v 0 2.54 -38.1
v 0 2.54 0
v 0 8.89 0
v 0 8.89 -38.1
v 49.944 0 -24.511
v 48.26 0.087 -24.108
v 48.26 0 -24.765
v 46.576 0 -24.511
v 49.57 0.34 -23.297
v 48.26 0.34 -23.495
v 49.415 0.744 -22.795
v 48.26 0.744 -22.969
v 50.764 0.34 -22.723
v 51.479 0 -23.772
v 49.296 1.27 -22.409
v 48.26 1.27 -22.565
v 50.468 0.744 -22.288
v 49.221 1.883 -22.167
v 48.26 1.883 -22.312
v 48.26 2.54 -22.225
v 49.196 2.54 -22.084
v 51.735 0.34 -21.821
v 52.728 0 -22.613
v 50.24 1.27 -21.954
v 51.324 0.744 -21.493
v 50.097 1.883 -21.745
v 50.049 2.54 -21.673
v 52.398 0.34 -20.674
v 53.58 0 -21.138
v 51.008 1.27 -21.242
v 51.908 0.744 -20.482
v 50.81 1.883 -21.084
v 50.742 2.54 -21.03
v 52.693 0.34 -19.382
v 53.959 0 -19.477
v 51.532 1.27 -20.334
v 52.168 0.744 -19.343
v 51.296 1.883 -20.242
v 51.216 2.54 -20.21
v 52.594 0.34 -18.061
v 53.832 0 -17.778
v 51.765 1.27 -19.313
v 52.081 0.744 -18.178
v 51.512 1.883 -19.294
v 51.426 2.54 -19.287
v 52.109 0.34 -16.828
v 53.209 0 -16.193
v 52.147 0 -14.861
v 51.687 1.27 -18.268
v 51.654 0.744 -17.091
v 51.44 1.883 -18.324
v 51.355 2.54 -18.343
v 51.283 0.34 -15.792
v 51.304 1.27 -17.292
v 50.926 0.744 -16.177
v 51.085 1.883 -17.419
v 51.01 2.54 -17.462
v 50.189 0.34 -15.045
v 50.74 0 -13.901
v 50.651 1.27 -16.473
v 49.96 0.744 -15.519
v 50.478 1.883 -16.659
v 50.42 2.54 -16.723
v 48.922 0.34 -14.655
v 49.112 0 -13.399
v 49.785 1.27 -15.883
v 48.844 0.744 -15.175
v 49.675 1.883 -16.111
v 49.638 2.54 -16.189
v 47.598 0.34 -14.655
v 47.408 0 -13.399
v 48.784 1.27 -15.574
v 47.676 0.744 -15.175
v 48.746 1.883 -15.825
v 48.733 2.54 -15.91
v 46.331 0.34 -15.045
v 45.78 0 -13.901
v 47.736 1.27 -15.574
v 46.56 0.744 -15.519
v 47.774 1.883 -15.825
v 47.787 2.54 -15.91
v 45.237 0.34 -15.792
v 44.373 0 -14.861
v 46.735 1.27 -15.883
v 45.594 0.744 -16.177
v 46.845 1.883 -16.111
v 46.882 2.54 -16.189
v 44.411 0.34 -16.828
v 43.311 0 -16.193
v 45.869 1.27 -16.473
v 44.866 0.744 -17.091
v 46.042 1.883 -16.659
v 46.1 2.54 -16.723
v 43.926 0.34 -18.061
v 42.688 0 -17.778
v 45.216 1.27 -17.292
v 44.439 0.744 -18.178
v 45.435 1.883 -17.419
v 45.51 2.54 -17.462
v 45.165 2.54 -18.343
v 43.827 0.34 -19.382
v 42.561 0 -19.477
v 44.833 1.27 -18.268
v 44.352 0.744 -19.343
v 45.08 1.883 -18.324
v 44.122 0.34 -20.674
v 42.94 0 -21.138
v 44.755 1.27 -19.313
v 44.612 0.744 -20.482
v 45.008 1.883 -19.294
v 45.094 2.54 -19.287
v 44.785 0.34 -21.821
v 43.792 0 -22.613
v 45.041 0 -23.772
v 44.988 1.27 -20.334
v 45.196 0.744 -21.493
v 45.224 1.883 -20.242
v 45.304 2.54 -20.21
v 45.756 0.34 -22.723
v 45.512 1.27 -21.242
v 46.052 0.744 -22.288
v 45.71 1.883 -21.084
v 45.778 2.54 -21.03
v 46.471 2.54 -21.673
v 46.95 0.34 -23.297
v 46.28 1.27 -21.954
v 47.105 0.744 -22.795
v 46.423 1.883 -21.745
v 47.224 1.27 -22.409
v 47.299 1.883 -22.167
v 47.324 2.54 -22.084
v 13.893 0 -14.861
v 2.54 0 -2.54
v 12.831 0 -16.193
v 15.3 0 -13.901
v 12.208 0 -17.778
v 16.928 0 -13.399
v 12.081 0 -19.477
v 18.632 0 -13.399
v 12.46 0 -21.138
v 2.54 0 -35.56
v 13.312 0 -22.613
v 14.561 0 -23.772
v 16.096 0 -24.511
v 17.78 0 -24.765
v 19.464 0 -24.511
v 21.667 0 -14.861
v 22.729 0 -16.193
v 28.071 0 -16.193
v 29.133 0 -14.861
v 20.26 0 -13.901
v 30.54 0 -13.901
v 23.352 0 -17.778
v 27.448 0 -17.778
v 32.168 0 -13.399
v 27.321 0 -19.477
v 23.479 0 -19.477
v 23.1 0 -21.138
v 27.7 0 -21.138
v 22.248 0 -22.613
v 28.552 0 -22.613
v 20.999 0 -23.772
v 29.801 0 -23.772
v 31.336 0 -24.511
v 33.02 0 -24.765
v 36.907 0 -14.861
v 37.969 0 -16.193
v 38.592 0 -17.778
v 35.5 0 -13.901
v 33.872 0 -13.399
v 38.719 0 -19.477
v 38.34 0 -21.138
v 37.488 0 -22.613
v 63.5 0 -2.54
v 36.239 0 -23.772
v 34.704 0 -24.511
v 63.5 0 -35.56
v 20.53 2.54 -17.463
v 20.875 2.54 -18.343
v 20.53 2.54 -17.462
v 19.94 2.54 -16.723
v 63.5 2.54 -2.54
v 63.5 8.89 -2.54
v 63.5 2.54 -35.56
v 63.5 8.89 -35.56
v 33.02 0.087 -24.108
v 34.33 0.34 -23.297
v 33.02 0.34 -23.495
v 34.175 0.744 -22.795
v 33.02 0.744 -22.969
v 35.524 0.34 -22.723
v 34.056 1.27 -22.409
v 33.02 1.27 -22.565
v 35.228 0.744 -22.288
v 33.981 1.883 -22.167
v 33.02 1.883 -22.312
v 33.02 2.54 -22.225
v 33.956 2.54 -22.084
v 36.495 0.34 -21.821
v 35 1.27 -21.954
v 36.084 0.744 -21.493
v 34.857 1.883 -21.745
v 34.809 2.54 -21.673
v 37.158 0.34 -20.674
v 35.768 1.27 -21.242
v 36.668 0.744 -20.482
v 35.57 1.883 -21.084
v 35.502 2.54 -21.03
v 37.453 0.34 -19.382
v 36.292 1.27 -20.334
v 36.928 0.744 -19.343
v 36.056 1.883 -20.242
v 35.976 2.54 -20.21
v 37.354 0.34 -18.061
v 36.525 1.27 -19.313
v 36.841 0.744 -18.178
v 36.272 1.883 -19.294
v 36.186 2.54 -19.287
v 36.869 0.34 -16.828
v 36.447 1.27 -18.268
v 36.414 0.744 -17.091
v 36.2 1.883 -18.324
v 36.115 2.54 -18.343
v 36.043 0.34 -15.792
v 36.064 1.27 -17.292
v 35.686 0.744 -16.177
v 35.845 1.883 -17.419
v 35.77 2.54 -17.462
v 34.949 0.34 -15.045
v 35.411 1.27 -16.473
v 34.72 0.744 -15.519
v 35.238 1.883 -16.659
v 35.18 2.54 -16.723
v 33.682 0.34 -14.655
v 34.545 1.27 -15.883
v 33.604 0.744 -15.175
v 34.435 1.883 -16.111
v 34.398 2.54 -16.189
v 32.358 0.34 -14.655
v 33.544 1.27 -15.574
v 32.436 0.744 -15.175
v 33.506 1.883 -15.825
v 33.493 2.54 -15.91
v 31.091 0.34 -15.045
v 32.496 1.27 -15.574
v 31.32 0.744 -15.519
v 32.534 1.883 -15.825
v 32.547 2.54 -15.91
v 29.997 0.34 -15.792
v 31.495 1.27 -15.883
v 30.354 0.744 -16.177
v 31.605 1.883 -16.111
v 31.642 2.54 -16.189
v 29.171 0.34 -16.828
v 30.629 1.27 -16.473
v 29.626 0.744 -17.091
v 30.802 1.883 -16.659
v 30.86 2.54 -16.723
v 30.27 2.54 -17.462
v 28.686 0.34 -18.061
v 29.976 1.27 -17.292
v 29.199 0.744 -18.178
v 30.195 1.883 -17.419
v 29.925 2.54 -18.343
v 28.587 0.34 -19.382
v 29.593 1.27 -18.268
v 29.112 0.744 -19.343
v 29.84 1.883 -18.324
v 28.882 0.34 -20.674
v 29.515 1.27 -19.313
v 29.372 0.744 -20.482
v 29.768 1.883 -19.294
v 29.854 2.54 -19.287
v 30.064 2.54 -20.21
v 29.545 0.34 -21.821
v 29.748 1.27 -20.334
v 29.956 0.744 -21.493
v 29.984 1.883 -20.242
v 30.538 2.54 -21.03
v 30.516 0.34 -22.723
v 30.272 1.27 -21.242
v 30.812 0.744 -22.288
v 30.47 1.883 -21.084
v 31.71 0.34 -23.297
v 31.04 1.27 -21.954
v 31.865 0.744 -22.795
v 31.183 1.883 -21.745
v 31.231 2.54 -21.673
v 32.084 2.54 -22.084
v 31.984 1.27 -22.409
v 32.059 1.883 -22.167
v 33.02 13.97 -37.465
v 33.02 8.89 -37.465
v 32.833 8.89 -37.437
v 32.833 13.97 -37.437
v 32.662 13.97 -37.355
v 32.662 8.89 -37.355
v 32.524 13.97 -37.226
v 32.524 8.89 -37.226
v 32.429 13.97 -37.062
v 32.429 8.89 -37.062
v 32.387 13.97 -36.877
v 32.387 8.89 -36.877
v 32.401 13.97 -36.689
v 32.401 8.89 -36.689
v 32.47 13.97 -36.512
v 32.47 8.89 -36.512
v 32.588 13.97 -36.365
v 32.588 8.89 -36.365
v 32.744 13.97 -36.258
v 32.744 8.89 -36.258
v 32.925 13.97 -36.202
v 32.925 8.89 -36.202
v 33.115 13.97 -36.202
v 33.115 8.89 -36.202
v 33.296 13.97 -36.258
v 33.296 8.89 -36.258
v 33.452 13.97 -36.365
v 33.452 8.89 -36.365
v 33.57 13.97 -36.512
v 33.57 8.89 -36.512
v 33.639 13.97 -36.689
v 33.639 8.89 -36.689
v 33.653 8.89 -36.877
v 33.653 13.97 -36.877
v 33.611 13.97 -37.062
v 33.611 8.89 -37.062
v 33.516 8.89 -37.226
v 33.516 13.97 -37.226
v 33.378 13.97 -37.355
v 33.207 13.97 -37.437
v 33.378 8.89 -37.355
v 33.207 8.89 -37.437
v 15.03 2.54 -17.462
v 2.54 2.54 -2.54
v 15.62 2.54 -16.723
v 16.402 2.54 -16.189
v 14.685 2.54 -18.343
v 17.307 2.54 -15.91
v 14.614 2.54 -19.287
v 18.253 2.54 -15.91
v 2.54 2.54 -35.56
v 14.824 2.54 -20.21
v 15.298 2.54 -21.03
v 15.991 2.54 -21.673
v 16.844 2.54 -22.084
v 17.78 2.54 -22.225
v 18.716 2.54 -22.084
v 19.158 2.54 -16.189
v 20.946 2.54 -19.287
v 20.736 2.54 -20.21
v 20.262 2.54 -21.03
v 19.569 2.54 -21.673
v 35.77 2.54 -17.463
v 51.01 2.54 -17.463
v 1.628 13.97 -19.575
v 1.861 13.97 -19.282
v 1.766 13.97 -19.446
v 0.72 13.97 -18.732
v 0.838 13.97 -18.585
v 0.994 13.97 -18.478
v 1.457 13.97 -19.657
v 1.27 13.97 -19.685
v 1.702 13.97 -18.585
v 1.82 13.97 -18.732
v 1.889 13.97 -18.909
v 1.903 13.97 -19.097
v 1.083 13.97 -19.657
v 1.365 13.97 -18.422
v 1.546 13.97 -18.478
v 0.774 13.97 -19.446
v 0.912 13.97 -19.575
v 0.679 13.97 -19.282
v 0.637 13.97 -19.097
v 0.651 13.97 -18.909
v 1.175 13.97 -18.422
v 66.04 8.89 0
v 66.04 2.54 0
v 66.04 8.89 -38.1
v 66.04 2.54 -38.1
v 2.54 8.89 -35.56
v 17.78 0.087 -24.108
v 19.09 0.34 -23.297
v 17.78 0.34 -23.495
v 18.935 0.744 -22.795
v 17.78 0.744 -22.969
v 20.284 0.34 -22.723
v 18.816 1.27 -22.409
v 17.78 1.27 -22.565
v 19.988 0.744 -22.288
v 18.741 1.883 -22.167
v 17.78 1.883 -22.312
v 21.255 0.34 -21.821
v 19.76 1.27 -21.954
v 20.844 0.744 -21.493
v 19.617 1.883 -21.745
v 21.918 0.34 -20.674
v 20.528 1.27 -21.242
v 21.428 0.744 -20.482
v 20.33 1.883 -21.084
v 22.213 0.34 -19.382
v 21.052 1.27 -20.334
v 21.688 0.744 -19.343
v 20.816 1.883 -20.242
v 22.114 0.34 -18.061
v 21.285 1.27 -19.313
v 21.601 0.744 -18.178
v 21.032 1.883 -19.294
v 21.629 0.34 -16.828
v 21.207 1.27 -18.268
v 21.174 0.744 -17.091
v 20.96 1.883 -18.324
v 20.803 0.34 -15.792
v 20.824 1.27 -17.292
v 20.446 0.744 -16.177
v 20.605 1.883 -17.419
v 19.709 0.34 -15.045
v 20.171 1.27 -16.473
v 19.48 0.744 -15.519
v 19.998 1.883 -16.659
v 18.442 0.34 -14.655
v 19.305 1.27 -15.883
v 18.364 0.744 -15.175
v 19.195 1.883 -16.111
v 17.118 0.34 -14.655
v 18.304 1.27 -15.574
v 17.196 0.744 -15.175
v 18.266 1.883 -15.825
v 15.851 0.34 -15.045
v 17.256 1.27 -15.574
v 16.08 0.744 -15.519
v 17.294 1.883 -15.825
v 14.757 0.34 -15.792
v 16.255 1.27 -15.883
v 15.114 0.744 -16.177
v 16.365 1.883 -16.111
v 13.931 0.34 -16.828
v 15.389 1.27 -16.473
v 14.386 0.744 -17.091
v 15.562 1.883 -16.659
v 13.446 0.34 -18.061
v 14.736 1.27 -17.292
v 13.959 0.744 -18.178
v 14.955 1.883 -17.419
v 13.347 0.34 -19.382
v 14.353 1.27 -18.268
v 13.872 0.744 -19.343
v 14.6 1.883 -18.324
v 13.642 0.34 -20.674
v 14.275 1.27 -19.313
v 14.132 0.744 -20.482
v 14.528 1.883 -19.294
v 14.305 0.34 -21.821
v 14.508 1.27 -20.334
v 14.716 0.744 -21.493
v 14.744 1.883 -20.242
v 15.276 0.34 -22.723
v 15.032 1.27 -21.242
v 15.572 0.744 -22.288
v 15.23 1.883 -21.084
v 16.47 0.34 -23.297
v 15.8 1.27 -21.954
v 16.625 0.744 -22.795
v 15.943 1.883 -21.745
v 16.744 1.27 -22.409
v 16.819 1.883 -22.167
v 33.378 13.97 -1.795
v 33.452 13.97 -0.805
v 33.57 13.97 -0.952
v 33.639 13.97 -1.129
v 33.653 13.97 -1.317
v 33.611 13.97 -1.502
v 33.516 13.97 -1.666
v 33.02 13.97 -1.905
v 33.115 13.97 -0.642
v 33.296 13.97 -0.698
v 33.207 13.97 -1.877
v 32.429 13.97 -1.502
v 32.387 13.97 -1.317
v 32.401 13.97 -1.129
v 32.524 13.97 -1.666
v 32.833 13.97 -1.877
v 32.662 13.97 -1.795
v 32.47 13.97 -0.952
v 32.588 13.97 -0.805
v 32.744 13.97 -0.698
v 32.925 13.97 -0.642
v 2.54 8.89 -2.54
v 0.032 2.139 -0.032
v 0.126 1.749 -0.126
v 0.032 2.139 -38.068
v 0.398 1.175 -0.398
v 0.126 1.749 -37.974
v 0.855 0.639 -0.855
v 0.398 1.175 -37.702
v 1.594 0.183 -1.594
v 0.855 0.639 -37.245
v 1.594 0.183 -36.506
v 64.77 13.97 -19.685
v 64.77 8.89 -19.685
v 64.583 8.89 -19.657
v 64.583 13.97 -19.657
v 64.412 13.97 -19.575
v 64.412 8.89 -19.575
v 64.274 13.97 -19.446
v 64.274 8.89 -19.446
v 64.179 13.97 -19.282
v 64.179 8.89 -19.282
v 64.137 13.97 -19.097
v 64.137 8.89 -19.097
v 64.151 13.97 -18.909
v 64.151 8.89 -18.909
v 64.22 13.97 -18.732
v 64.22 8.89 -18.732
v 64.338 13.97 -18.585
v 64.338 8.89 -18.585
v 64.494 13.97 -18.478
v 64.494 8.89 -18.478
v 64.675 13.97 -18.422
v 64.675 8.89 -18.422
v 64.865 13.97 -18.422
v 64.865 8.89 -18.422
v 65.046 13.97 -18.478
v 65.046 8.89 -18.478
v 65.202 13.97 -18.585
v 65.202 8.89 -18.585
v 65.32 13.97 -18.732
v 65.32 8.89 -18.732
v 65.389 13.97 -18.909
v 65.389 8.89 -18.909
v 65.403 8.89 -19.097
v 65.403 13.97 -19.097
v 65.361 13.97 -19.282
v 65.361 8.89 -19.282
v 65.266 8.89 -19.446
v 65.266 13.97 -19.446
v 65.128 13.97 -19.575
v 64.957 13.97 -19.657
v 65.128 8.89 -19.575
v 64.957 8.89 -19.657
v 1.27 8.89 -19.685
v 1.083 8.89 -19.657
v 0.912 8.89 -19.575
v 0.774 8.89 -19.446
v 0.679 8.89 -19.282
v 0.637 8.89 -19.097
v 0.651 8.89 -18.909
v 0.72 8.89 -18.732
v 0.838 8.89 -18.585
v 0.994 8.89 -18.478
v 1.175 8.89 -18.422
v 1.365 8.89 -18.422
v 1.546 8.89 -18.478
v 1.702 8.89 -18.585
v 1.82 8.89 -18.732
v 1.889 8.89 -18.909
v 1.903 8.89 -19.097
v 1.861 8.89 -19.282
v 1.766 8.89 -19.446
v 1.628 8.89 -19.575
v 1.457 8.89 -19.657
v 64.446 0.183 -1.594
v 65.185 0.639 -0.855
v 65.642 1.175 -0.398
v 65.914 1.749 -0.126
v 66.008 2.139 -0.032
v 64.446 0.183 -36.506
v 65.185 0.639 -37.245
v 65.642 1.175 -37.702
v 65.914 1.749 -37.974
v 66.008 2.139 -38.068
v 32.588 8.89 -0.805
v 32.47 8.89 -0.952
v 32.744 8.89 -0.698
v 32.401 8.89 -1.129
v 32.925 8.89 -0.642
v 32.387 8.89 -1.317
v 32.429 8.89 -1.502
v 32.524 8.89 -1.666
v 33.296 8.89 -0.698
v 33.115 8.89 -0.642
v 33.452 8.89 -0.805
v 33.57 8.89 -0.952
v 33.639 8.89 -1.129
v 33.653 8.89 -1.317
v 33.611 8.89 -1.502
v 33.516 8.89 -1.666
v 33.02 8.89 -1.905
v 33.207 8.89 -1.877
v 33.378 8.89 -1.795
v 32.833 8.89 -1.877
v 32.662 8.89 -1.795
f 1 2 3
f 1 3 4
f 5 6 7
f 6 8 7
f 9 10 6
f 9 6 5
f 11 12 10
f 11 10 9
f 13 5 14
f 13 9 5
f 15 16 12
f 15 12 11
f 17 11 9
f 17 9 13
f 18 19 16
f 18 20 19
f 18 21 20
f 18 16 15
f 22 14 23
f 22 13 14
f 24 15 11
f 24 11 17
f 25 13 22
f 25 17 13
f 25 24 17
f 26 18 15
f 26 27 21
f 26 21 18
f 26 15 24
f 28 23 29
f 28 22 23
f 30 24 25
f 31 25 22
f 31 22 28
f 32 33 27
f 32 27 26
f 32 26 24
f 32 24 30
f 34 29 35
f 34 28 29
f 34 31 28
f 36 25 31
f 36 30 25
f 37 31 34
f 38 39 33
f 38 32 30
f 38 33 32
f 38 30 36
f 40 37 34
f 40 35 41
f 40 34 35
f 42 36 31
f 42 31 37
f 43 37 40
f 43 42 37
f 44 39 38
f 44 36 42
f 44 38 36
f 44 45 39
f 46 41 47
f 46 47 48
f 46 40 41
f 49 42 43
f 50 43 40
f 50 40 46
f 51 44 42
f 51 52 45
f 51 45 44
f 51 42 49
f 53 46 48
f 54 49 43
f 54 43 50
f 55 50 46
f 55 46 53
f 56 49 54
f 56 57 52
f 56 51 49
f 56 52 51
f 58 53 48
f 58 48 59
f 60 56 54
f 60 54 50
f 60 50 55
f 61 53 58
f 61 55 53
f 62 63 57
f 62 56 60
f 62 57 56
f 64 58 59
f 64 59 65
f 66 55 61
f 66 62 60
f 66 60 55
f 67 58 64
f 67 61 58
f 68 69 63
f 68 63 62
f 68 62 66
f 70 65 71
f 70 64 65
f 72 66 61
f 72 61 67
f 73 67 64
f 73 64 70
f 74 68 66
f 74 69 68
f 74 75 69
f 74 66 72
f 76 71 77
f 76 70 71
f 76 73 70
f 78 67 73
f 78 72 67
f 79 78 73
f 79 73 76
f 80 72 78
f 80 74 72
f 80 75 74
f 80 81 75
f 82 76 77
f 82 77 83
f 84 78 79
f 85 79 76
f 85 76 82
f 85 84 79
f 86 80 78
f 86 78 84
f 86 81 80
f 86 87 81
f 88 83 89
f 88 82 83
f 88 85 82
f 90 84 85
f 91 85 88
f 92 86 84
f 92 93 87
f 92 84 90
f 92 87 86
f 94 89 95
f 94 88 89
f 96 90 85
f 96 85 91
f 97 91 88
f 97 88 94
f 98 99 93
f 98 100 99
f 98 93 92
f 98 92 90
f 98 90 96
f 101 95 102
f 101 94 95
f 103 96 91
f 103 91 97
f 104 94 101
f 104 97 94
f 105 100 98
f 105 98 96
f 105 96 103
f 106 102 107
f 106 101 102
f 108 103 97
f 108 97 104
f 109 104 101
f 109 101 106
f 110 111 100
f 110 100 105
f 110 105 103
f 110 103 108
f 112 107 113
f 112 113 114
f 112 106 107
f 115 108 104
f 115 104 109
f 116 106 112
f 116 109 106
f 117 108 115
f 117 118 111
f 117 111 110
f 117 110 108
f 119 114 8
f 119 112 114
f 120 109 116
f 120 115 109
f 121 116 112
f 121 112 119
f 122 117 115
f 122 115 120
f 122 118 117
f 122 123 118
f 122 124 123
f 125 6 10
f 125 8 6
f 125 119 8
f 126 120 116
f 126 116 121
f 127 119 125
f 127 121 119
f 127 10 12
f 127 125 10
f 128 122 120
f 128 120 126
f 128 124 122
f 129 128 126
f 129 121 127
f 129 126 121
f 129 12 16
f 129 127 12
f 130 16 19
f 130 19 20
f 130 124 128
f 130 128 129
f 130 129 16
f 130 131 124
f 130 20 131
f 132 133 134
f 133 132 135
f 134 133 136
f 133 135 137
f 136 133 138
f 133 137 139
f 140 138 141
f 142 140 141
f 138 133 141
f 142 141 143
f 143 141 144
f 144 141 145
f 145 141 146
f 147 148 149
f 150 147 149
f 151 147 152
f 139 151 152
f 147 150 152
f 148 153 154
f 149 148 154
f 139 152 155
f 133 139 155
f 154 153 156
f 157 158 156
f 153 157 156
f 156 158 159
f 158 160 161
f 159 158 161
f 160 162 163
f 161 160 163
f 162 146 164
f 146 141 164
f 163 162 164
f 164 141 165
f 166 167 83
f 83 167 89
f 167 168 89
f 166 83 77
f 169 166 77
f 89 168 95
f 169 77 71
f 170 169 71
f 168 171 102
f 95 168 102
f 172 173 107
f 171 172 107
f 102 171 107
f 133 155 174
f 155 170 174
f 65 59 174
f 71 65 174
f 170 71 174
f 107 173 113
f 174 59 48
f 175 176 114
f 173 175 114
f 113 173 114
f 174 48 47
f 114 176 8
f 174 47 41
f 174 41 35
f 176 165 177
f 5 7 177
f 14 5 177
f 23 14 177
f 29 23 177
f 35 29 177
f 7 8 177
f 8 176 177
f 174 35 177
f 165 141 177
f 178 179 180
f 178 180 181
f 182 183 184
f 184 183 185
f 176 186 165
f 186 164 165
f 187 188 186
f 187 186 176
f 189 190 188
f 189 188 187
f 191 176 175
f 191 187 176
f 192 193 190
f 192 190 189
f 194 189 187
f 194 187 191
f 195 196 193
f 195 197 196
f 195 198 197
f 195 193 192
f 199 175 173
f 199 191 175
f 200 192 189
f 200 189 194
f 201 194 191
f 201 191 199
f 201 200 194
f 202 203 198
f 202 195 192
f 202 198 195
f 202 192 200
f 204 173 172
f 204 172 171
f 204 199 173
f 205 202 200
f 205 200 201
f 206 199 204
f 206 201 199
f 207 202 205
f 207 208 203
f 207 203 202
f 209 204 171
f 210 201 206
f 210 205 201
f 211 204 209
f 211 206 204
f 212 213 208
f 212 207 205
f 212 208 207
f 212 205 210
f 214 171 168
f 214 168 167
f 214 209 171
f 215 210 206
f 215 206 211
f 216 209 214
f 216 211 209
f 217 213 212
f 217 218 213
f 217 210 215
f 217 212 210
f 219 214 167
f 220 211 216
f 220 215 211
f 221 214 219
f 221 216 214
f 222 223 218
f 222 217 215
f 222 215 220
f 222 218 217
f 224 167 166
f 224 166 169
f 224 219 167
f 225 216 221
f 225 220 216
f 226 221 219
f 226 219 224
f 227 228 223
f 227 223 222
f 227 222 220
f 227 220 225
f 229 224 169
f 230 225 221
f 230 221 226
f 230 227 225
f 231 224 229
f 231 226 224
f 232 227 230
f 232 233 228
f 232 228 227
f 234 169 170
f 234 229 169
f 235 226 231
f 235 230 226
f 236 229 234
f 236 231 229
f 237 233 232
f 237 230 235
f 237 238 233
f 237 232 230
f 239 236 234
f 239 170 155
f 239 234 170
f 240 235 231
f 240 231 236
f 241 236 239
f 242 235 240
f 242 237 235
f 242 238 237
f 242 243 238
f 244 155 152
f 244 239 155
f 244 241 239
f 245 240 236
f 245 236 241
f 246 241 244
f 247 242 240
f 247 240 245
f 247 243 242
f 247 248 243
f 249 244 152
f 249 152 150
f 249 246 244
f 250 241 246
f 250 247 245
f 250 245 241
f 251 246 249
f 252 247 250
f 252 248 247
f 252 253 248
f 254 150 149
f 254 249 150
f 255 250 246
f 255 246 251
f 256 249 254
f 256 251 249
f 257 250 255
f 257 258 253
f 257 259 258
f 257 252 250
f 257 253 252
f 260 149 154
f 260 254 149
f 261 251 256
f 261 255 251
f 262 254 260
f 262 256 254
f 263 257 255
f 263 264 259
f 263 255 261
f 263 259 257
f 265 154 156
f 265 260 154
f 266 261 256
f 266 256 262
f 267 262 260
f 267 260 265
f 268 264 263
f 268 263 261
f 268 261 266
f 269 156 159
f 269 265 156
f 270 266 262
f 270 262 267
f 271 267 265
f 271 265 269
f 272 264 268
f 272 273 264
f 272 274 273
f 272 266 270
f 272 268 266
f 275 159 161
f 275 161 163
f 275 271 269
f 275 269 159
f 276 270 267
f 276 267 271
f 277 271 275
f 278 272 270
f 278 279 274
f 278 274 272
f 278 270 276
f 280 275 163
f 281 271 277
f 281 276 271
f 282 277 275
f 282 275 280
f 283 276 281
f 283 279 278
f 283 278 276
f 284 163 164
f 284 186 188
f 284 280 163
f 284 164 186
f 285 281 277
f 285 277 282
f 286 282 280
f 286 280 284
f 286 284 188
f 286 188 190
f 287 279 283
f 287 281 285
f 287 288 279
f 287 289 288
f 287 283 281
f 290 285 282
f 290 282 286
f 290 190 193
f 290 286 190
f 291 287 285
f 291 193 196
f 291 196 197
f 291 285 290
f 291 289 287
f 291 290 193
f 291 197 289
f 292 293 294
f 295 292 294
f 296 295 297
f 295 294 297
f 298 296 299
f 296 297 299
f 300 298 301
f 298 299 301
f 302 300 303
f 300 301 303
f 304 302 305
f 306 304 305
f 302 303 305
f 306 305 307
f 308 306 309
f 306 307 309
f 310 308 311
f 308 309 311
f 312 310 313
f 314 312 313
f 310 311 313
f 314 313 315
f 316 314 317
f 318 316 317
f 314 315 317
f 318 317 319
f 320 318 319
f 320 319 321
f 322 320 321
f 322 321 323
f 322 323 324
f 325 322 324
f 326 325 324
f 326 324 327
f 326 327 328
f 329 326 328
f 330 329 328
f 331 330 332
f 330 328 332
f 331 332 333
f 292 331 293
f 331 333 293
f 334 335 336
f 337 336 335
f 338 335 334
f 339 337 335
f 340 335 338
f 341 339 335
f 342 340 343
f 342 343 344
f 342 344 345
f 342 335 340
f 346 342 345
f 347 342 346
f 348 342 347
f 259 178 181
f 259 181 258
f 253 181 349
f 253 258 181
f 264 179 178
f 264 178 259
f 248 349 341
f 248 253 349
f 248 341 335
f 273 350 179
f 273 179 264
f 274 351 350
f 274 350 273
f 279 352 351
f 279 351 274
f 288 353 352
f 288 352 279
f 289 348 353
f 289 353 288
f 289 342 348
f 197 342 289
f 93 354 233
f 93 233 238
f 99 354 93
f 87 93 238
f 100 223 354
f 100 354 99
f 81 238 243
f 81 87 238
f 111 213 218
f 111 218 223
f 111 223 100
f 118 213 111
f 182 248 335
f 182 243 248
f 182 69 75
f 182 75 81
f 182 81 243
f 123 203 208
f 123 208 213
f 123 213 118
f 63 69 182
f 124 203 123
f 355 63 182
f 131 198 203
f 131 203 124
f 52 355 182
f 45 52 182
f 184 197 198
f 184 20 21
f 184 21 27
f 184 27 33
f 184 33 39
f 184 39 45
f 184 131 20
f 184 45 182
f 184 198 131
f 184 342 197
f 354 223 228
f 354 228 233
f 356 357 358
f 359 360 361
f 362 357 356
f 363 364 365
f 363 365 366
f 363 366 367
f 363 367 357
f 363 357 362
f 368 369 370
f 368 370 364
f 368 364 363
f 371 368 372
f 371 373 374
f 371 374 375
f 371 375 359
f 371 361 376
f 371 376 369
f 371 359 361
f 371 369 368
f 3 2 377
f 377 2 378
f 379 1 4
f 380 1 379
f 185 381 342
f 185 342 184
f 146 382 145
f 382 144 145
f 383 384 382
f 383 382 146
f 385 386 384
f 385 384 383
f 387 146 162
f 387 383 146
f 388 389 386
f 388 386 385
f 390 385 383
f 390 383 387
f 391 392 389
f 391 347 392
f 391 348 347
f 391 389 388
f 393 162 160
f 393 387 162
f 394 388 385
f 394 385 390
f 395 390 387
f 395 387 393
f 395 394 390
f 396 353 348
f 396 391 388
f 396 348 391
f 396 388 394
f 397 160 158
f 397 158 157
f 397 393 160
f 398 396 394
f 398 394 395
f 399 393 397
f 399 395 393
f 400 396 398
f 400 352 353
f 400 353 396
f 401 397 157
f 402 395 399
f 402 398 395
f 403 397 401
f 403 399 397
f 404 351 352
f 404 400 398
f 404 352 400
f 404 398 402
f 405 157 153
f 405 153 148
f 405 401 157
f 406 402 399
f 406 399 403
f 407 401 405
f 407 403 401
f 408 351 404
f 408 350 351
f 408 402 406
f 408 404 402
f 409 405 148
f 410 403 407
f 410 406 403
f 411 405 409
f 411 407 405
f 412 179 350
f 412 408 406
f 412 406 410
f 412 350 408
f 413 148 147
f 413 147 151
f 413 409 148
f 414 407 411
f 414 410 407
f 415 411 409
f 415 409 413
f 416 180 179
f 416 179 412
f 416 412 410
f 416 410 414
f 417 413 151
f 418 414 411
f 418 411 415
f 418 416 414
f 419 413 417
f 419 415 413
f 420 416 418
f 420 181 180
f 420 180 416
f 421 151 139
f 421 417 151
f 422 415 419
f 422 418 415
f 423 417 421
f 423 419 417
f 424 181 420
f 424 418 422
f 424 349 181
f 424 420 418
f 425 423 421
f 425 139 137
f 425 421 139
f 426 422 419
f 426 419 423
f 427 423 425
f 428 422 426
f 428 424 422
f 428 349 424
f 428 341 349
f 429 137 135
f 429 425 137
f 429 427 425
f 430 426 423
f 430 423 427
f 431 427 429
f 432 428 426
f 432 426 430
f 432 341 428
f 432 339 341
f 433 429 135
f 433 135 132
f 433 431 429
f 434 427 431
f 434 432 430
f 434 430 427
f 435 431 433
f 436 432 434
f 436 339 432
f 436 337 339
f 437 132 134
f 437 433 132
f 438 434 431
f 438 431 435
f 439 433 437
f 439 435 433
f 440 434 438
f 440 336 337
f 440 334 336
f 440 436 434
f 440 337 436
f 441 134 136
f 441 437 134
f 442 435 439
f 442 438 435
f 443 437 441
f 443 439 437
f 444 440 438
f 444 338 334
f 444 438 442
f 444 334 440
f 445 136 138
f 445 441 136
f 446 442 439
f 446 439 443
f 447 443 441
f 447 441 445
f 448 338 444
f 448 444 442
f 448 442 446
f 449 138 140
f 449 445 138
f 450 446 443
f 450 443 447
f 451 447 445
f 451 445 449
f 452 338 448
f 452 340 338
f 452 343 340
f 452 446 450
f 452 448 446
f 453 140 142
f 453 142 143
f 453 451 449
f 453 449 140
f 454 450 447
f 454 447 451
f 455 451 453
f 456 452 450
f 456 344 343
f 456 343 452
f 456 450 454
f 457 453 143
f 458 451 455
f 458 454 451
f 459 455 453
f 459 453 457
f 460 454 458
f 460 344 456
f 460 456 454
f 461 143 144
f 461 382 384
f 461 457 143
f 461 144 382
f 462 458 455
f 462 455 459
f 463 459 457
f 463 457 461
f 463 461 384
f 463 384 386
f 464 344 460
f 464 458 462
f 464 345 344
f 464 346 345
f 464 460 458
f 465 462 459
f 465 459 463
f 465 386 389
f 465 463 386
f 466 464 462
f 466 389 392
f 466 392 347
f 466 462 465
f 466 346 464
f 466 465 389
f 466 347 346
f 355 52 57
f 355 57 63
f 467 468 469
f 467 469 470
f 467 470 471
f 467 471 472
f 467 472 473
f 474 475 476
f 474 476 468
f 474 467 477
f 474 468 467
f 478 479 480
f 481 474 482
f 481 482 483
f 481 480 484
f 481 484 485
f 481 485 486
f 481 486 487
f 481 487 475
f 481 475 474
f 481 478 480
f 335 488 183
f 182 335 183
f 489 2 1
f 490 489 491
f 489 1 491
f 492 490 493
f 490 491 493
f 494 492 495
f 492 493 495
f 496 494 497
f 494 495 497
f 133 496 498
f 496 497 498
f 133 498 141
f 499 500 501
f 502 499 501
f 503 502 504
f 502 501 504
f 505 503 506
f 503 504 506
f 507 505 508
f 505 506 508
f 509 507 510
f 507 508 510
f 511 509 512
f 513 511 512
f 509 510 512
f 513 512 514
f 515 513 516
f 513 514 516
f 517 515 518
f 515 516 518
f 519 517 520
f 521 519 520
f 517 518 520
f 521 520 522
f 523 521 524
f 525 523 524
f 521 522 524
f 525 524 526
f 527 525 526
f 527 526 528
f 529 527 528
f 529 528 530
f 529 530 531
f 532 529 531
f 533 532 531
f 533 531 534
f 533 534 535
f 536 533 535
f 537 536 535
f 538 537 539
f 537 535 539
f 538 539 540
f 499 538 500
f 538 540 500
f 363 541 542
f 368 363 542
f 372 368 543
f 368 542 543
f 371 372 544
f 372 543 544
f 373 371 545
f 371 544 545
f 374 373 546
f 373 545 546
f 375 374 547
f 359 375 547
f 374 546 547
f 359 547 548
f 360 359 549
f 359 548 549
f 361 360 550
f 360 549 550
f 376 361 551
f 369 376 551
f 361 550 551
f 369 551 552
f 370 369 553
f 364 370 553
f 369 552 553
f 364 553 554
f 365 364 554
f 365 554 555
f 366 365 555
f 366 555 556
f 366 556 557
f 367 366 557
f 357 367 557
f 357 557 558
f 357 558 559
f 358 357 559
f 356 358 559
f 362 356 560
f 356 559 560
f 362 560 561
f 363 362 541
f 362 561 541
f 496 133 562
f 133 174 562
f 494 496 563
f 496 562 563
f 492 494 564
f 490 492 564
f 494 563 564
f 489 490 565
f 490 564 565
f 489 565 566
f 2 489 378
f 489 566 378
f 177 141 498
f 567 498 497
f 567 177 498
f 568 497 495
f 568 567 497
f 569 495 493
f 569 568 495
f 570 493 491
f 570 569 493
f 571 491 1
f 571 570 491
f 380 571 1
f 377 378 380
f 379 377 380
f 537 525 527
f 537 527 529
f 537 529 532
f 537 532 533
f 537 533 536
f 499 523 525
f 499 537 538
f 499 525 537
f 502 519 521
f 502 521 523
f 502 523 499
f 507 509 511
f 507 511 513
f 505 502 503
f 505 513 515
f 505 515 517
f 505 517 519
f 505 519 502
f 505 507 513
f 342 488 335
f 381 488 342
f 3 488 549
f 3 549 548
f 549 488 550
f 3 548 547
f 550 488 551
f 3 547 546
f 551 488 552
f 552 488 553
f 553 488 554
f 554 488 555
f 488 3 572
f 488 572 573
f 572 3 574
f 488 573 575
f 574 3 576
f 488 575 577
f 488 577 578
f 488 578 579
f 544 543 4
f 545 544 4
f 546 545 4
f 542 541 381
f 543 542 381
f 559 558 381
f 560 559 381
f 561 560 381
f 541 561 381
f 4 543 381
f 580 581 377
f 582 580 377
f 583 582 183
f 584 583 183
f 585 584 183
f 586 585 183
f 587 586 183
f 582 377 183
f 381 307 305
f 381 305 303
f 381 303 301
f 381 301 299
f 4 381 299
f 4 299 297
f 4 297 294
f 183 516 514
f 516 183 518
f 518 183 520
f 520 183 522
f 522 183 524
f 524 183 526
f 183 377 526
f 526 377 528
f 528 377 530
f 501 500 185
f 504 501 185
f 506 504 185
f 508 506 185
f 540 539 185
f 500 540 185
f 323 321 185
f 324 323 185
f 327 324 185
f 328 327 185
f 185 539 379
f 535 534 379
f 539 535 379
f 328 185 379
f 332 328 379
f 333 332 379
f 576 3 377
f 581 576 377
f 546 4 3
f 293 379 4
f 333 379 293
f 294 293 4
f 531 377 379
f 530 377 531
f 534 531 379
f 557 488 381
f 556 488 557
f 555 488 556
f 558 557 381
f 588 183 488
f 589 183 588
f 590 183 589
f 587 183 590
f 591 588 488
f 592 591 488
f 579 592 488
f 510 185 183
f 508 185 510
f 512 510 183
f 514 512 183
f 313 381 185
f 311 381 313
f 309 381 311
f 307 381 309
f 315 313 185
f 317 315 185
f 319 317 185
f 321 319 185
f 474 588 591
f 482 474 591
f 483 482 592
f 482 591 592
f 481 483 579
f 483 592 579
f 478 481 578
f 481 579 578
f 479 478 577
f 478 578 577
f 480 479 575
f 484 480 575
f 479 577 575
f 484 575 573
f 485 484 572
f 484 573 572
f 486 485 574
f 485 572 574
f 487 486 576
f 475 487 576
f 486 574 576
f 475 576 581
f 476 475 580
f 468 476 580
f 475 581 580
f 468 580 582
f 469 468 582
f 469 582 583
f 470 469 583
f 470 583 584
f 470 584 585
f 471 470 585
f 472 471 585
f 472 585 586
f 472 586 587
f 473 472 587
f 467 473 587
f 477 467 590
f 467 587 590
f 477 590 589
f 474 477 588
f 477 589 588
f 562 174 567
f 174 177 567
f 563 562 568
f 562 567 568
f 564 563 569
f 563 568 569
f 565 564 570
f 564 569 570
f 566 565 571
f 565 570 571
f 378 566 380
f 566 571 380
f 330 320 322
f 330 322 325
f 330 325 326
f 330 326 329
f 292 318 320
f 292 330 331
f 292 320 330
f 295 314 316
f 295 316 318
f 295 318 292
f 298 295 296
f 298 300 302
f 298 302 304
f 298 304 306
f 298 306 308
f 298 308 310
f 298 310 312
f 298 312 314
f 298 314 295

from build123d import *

# Parameters (mm, degrees)
SKETCH1_W           = 66.04
SKETCH1_H           = 38.1
BOSS_EXTRUDE3_DEPTH = 17.78
SKETCH3_W           = 60.96
SKETCH3_H           = 33.02
CUT_EXTRUDE1_DEPTH  = 15.24
SKETCH4_W           = 38.1
SKETCH4_H           = 8.89
CUT_EXTRUDE2_DEPTH  = 66.04
SKETCH5_R           = 0.635
BOSS_EXTRUDE4_DEPTH = 5.08
SKETCH6_R           = 3.175
CUT_EXTRUDE4_DEPTH  = 2.54
FILLET1_R           = 2.54


with BuildPart() as part:
    # Sketch1 → Boss-Extrude3 (new body)
    with BuildSketch(Plane(origin=(0, 0, 0), x_dir=(1, 0, 0), z_dir=(0, 1, 0))):
        with Locations((33.02, 19.05)):
            Rectangle(SKETCH1_W, SKETCH1_H)
    extrude(amount=BOSS_EXTRUDE3_DEPTH)

    # Sketch3 → Cut-Extrude1 (cut)
    with BuildSketch(Plane(origin=(0, 17.78, 0), x_dir=(1, 0, 0), z_dir=(0, 1, 0))):
        with Locations((33.02, 19.05)):
            Rectangle(SKETCH3_W, SKETCH3_H)
    extrude(amount=-CUT_EXTRUDE1_DEPTH, mode=Mode.SUBTRACT)

    # Sketch4 → Cut-Extrude2 (cut)
    with BuildSketch(Plane(origin=(66.04, 0, 0), x_dir=(0, 0, -1), z_dir=(1, 0, 0))):
        with Locations((19.05, 13.335)):
            Rectangle(SKETCH4_W, SKETCH4_H)
    extrude(amount=-CUT_EXTRUDE2_DEPTH, mode=Mode.SUBTRACT)

    # Sketch5 → Boss-Extrude4 (add)
    with BuildSketch(Plane(origin=(0, 8.89, 0), x_dir=(1, 0, 0), z_dir=(0, 1, 0))):
        with Locations(Location((33.02, 36.83, 0), (0, 0, 90))):
            Circle(SKETCH5_R)
        with Locations(Location((33.02, 1.27, 0), (0, 0, 90))):
            Circle(SKETCH5_R)
        with Locations(Location((1.27, 19.05, 0), (0, 0, 90))):
            Circle(SKETCH5_R)
        with Locations(Location((64.77, 19.05, 0), (0, 0, 90))):
            Circle(SKETCH5_R)
    extrude(amount=BOSS_EXTRUDE4_DEPTH)

    # Sketch6 → Cut-Extrude4 (cut)
    with BuildSketch(Plane.XZ):
        with Locations(Location((17.78, -19.05, 0), (0, 0, 270))):
            Circle(SKETCH6_R)
        with Locations(Location((33.02, -19.05, 0), (0, 0, 270))):
            Circle(SKETCH6_R)
        with Locations(Location((48.26, -19.05, 0), (0, 0, 270))):
            Circle(SKETCH6_R)
    extrude(amount=-CUT_EXTRUDE4_DEPTH, mode=Mode.SUBTRACT)

    # Fillet1
    fillet1_edges = [part.edges().sort_by_distance(p)[0] for p in [
        (33.02, 0, -38.1),
        (66.04, 0, -19.05),
        (33.02, 0, 0),
        (0, 0, -19.05),
        (17.78, 0, -15.875),
        (33.02, 0, -15.875),
        (48.26, 0, -15.875),
    ]]
    fillet(fillet1_edges, radius=FILLET1_R - 0.0001)  # a hair under: the kernel refuses the full size


solid = part.part
